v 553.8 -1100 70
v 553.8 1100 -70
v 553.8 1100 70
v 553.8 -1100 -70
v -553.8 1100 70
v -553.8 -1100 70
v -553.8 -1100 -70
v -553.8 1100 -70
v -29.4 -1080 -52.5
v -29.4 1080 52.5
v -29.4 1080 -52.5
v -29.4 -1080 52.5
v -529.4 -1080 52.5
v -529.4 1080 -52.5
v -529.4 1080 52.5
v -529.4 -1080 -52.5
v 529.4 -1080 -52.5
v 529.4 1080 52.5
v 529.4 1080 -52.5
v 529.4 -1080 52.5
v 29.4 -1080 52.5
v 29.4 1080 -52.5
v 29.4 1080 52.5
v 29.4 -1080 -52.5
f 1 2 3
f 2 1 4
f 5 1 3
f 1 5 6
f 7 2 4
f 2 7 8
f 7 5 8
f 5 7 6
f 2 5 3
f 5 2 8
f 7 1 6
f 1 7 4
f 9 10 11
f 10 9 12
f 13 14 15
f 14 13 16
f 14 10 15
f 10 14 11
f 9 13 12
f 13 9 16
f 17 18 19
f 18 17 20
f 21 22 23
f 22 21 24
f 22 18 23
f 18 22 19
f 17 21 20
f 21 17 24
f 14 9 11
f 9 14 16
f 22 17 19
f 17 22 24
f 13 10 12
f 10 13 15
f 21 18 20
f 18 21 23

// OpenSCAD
// ====================================================================================
// REVOLUTIONARY TECHNOLOGY COMPANY & UNIVERSITY OF WASHINGTON DEPARTMENT OF PHYSICS
// Subsystem: impala_ss_battery_vault.scad (Sedan 120 kWh Structural Energy Core)
// Core Application: Floor-Pan Nested Traction Cells / 2016 Seat Rail Anchors
// COMPLIANCE GATE: Form-fitted to clear the 65mm lower armor clearance envelope
// Center Origin (0,0,0) = Geometric Centerpoint of the Underbelly Battery Pan Face
// ====================================================================================

$fn = 100; // High-precision waterjet cutting and laser profiling path resolution

// --- Sedan Structural Pack Dimensions (mm) ---
inch_to_mm         = 25.4;
frame_inner_w      = 44.0 * inch_to_mm;  // 1117.60 mm clear span clearance between rails [0.11]
pack_total_length  = 2200.00;          // Maximized longitudinally across the full floor bed
pack_total_height  = 140.00;           // Low-profile 140mm thickness protecting car ground clearance
wall_thickness_ti  = 6.35;               // 1/4" Structural Titanium Grade 5 walls [0.11]

// Internal Cell Partition Sizing
cell_module_bay_w  = 500.00;           // Left and right isolated cell module bays
vapor_plate_thick  = 15.00;            // Phase-Change horizontal cooling jacket clearance

module sedan_titanium_battery_vault() {
    echo("COMPILING 2027 IMPALA SS MAX-CAPACITY STRUCTURAL FAMILY VAULT");
    color("DimGrey") {
        difference() {
            // Main horizontal low-profile structural cell container box
            cube([frame_inner_w - 10, pack_total_length, pack_total_height], center=true);
            
            // Left Side Cell Module Chamber
            translate([-frame_inner_w/4, 0, 0])
                cube([cell_module_bay_w, pack_total_length - 40, pack_total_height - (2*wall_thickness_ti)], center=true);
                
            // Right Side Cell Module Chamber
            translate([frame_inner_w/4, 0, 0])
                cube([cell_module_bay_w, pack_total_length - 40, pack_total_height - (2*wall_thickness_ti)], center=true);
        }
    }
}

module rt_phase_change_cooling_lines() {
    // Integrated horizontal vapor chamber layers that flush thermal build-up straight to scuppers
    color("Copper") {
        for (z_offset = [-pack_total_height/2 + 10, pack_total_height/2 - 10]) {
            translate([0, 0, z_offset])
                cube([frame_inner_w - 30, pack_total_length - 20, vapor_plate_thick], center=true);
        }
    }
}

// --- Composite Structural Energy Vault Instantiation ---
union() {
    sedan_titanium_battery_vault();
    rt_phase_change_cooling_lines();
}
